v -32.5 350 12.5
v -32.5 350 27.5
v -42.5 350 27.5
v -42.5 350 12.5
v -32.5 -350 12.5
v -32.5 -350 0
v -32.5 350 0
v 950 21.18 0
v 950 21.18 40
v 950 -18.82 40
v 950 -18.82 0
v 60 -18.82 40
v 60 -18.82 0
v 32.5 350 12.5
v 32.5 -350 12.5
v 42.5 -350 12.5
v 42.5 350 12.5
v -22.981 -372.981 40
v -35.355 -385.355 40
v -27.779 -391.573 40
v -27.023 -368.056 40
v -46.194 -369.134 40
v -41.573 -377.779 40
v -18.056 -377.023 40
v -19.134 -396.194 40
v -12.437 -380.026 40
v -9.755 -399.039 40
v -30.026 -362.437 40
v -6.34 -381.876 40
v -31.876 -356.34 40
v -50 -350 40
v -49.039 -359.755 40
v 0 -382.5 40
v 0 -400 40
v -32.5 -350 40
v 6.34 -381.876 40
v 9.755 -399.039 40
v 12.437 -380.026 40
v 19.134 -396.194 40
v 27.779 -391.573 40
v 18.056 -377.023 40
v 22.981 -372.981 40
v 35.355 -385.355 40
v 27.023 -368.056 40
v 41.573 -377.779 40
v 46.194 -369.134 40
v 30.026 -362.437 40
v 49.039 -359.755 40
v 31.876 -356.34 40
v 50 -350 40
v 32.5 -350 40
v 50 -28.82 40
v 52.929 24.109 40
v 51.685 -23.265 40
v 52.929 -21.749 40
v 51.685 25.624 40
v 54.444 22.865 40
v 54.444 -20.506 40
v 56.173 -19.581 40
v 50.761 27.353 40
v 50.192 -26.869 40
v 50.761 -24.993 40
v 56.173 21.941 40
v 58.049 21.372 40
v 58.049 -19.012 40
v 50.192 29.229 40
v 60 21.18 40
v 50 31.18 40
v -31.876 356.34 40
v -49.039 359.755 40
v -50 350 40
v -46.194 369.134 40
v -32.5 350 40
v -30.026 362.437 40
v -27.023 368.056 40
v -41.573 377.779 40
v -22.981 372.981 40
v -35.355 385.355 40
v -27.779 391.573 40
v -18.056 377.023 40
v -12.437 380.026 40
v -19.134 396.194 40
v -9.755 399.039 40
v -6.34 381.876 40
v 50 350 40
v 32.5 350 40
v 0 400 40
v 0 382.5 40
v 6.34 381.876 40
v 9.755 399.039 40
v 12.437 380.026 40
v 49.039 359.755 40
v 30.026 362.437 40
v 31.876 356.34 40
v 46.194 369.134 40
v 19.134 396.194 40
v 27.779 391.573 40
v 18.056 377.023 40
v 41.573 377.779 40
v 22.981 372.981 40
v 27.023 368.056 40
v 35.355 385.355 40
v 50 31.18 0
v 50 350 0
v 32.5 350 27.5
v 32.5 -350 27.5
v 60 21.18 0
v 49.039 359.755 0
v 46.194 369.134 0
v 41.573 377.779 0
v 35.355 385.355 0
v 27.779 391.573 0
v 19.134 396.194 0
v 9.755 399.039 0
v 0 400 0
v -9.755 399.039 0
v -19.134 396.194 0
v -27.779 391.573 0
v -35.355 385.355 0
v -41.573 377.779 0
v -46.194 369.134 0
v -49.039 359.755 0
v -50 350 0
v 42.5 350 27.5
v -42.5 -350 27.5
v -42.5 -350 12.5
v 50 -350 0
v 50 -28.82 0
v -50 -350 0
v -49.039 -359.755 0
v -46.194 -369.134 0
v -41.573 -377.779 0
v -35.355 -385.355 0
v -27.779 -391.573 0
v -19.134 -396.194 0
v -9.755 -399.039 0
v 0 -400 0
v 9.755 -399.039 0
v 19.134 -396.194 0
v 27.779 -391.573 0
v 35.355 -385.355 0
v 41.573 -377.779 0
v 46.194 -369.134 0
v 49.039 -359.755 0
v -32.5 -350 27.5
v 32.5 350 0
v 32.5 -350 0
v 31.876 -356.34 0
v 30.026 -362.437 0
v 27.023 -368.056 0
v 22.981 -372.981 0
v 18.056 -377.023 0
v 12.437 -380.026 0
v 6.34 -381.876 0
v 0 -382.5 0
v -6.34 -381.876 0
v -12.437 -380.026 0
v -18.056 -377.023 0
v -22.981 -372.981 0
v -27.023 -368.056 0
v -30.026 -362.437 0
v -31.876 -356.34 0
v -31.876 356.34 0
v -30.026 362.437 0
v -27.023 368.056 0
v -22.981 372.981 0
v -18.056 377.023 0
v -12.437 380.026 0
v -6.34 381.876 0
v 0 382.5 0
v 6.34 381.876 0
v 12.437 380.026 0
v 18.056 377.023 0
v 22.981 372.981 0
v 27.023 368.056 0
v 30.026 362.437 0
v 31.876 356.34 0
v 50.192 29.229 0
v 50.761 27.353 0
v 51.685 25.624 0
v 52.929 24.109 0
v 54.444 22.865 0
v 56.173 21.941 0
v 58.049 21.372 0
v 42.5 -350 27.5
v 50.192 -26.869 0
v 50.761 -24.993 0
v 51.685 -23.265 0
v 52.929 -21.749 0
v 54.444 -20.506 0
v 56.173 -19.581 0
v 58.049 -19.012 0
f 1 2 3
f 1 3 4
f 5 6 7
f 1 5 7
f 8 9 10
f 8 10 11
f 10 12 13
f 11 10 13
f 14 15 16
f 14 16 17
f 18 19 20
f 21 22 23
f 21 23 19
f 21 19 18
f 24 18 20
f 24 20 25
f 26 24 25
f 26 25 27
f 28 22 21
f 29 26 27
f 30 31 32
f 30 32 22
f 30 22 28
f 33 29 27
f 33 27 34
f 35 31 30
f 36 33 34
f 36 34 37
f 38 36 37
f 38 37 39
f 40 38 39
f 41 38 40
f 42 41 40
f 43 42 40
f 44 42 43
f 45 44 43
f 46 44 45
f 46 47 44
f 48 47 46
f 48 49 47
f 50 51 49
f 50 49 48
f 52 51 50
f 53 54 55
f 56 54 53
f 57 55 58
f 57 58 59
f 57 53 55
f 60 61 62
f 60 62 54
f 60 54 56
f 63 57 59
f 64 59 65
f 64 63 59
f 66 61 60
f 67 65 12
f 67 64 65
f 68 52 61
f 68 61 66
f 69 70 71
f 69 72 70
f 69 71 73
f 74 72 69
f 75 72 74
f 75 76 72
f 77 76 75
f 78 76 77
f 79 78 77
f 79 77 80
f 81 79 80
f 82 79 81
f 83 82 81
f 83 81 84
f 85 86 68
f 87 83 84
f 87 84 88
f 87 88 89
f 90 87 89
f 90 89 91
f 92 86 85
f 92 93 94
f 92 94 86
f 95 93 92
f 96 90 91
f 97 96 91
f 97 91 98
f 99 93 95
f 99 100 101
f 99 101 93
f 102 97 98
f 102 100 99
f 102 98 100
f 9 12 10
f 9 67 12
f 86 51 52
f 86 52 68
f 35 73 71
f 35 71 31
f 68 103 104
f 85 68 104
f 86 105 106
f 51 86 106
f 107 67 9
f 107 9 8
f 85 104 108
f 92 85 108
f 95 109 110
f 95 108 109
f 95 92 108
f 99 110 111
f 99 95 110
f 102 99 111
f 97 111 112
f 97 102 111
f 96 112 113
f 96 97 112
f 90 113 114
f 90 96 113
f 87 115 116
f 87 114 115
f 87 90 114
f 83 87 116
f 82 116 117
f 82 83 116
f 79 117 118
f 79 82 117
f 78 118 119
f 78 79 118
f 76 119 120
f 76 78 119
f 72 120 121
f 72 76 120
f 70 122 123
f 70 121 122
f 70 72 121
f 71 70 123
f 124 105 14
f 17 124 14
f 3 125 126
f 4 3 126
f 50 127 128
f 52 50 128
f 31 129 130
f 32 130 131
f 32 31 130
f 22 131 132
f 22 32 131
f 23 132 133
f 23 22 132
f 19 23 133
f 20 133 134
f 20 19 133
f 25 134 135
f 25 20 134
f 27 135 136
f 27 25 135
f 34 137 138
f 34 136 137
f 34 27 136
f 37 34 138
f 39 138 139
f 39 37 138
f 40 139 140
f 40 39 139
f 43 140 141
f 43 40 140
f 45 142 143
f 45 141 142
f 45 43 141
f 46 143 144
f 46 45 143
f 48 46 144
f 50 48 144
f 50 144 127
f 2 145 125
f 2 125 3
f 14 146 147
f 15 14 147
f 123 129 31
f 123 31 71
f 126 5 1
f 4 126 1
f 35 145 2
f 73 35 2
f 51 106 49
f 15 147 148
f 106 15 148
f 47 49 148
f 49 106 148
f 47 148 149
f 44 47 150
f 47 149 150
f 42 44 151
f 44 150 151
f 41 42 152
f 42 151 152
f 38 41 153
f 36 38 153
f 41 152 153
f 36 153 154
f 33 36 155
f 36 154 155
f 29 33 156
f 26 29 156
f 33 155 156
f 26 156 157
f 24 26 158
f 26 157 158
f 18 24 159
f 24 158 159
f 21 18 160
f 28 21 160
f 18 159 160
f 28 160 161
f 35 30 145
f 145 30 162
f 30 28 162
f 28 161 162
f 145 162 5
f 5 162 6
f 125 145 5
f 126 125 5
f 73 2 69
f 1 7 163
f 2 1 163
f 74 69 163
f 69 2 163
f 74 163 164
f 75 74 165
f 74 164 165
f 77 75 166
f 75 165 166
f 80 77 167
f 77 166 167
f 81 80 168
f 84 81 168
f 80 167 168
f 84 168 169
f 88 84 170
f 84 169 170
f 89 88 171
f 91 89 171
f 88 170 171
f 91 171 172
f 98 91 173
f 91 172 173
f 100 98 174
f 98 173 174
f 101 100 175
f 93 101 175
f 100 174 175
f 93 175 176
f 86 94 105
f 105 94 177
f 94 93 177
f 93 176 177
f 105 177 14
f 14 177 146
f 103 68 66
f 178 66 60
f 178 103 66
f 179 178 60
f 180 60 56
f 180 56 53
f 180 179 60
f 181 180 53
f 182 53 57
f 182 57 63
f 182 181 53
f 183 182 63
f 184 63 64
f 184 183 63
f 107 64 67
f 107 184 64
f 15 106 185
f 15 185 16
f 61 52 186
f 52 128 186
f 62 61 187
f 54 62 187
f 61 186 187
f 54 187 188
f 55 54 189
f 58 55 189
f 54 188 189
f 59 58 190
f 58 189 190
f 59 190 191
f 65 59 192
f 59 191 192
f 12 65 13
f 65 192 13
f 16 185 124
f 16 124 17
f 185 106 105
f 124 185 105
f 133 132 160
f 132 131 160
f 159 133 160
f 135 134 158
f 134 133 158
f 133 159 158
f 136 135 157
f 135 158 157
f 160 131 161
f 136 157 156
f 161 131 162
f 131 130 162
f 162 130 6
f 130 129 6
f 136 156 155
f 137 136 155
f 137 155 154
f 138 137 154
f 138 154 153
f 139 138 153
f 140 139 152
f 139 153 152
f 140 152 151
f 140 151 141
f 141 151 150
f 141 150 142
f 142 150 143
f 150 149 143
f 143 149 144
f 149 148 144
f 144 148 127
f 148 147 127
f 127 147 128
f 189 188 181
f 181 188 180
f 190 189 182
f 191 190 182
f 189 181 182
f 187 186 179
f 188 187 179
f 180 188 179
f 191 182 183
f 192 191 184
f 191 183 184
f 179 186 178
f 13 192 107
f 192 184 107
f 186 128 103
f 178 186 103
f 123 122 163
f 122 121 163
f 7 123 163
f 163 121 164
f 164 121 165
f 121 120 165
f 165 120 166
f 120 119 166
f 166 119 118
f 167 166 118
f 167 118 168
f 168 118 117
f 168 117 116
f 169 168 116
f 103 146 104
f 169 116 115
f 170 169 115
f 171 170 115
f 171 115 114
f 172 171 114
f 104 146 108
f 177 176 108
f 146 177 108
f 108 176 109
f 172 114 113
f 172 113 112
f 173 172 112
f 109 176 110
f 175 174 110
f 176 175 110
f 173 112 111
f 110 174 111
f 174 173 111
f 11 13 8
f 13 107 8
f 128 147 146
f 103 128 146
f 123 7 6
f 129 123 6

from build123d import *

# Parameters (mm, degrees)
SKETCH1_W           = 100
SKETCH1_H           = 800
BOSS_EXTRUDE1_DEPTH = 40
FILLET1_RADIUS      = 50
FILLET1_LENGTH      = 40
FILLET2_RADIUS      = 50
FILLET2_LENGTH      = 40
CUT_EXTRUDE1_DEPTH  = 406.092582011
SKETCH3_W           = 15
SKETCH3_H           = 700
CUT_EXTRUDE2_DEPTH  = 10
SKETCH4_W           = 40
SKETCH4_H           = 40
BOSS_EXTRUDE2_DEPTH = 900
FILLET3_R           = 10


with BuildPart() as part:
    # Sketch1 → Boss-Extrude1 (new body)
    with BuildSketch(Plane.XY):
        Rectangle(SKETCH1_W, SKETCH1_H)
    extrude(amount=BOSS_EXTRUDE1_DEPTH)

    # Fillet1: full round fillet: the end face becomes a half cylinder, R = half its width
    fillet1_face = Plane((0, 400, 20), x_dir=(0, 0, 1), z_dir=(0, 1, 0))  # on the end face: x along it, z out of the body
    fillet1_slab = fillet1_face.offset(-FILLET1_RADIUS / 2) * Box(FILLET1_LENGTH, 2 * FILLET1_RADIUS, FILLET1_RADIUS, mode=Mode.PRIVATE)  # the body's end, R deep
    fillet1_round = Plane((0, 350, 20), x_dir=(0, 1, 0), z_dir=(0, 0, 1)) * Cylinder(FILLET1_RADIUS, FILLET1_LENGTH, mode=Mode.PRIVATE)  # its axis R under the face
    add(fillet1_slab - fillet1_round, mode=Mode.SUBTRACT)

    # Fillet2: full round fillet: the end face becomes a half cylinder, R = half its width
    fillet2_face = Plane((0, -400, 20), x_dir=(0, 0, 1), z_dir=(0, -1, 0))  # on the end face: x along it, z out of the body
    fillet2_slab = fillet2_face.offset(-FILLET2_RADIUS / 2) * Box(FILLET2_LENGTH, 2 * FILLET2_RADIUS, FILLET2_RADIUS, mode=Mode.PRIVATE)  # the body's end, R deep
    fillet2_round = Plane((0, -350, 20), x_dir=(0, -1, 0), z_dir=(0, 0, 1)) * Cylinder(FILLET2_RADIUS, FILLET2_LENGTH, mode=Mode.PRIVATE)  # its axis R under the face
    add(fillet2_slab - fillet2_round, mode=Mode.SUBTRACT)

    # Sketch2 → Cut-Extrude1 (cut, through all)
    with BuildSketch(Plane(origin=(0, 0, 0), x_dir=(-1, 0, 0), z_dir=(0, 0, -1))):
        with BuildLine():
            Line((-32.5, 350), (-32.5, -350))
            ThreePointArc((-32.5, -350), (0, -382.5), (32.5, -350))
            Line((32.5, -350), (32.5, 350))
            ThreePointArc((32.5, 350), (0, 382.5), (-32.5, 350))
        make_face()
    extrude(amount=-CUT_EXTRUDE1_DEPTH, mode=Mode.SUBTRACT)

    # Sketch3 → Cut-Extrude2 (cut)
    with BuildSketch(Plane(origin=(-32.5, 0, 0), x_dir=(0, 0, -1), z_dir=(1, 0, 0))):
        with Locations((-20, 0)):
            Rectangle(SKETCH3_W, SKETCH3_H)
    cut_extrude2 = extrude(amount=-CUT_EXTRUDE2_DEPTH, mode=Mode.SUBTRACT)

    # Mirror1: Cut-Extrude2 across plane
    add(cut_extrude2.mirror(Plane(origin=(0, 0, 0), x_dir=(0, 0, 1), z_dir=(1, 0, 0))), mode=Mode.SUBTRACT)

    # Sketch4 → Boss-Extrude2 (add)
    with BuildSketch(Plane(origin=(50, 0, 0), x_dir=(0, 0, -1), z_dir=(1, 0, 0))):
        with Locations((-20, 1.179779929)):
            Rectangle(SKETCH4_W, SKETCH4_H)
    extrude(amount=BOSS_EXTRUDE2_DEPTH)

    # Fillet3
    fillet3_edges = [part.edges().sort_by_distance(p)[0] for p in [
        (50, 21.179779929, 20),
        (50, -18.820220071, 20),
    ]]
    fillet(fillet3_edges, radius=FILLET3_R)


solid = part.part
